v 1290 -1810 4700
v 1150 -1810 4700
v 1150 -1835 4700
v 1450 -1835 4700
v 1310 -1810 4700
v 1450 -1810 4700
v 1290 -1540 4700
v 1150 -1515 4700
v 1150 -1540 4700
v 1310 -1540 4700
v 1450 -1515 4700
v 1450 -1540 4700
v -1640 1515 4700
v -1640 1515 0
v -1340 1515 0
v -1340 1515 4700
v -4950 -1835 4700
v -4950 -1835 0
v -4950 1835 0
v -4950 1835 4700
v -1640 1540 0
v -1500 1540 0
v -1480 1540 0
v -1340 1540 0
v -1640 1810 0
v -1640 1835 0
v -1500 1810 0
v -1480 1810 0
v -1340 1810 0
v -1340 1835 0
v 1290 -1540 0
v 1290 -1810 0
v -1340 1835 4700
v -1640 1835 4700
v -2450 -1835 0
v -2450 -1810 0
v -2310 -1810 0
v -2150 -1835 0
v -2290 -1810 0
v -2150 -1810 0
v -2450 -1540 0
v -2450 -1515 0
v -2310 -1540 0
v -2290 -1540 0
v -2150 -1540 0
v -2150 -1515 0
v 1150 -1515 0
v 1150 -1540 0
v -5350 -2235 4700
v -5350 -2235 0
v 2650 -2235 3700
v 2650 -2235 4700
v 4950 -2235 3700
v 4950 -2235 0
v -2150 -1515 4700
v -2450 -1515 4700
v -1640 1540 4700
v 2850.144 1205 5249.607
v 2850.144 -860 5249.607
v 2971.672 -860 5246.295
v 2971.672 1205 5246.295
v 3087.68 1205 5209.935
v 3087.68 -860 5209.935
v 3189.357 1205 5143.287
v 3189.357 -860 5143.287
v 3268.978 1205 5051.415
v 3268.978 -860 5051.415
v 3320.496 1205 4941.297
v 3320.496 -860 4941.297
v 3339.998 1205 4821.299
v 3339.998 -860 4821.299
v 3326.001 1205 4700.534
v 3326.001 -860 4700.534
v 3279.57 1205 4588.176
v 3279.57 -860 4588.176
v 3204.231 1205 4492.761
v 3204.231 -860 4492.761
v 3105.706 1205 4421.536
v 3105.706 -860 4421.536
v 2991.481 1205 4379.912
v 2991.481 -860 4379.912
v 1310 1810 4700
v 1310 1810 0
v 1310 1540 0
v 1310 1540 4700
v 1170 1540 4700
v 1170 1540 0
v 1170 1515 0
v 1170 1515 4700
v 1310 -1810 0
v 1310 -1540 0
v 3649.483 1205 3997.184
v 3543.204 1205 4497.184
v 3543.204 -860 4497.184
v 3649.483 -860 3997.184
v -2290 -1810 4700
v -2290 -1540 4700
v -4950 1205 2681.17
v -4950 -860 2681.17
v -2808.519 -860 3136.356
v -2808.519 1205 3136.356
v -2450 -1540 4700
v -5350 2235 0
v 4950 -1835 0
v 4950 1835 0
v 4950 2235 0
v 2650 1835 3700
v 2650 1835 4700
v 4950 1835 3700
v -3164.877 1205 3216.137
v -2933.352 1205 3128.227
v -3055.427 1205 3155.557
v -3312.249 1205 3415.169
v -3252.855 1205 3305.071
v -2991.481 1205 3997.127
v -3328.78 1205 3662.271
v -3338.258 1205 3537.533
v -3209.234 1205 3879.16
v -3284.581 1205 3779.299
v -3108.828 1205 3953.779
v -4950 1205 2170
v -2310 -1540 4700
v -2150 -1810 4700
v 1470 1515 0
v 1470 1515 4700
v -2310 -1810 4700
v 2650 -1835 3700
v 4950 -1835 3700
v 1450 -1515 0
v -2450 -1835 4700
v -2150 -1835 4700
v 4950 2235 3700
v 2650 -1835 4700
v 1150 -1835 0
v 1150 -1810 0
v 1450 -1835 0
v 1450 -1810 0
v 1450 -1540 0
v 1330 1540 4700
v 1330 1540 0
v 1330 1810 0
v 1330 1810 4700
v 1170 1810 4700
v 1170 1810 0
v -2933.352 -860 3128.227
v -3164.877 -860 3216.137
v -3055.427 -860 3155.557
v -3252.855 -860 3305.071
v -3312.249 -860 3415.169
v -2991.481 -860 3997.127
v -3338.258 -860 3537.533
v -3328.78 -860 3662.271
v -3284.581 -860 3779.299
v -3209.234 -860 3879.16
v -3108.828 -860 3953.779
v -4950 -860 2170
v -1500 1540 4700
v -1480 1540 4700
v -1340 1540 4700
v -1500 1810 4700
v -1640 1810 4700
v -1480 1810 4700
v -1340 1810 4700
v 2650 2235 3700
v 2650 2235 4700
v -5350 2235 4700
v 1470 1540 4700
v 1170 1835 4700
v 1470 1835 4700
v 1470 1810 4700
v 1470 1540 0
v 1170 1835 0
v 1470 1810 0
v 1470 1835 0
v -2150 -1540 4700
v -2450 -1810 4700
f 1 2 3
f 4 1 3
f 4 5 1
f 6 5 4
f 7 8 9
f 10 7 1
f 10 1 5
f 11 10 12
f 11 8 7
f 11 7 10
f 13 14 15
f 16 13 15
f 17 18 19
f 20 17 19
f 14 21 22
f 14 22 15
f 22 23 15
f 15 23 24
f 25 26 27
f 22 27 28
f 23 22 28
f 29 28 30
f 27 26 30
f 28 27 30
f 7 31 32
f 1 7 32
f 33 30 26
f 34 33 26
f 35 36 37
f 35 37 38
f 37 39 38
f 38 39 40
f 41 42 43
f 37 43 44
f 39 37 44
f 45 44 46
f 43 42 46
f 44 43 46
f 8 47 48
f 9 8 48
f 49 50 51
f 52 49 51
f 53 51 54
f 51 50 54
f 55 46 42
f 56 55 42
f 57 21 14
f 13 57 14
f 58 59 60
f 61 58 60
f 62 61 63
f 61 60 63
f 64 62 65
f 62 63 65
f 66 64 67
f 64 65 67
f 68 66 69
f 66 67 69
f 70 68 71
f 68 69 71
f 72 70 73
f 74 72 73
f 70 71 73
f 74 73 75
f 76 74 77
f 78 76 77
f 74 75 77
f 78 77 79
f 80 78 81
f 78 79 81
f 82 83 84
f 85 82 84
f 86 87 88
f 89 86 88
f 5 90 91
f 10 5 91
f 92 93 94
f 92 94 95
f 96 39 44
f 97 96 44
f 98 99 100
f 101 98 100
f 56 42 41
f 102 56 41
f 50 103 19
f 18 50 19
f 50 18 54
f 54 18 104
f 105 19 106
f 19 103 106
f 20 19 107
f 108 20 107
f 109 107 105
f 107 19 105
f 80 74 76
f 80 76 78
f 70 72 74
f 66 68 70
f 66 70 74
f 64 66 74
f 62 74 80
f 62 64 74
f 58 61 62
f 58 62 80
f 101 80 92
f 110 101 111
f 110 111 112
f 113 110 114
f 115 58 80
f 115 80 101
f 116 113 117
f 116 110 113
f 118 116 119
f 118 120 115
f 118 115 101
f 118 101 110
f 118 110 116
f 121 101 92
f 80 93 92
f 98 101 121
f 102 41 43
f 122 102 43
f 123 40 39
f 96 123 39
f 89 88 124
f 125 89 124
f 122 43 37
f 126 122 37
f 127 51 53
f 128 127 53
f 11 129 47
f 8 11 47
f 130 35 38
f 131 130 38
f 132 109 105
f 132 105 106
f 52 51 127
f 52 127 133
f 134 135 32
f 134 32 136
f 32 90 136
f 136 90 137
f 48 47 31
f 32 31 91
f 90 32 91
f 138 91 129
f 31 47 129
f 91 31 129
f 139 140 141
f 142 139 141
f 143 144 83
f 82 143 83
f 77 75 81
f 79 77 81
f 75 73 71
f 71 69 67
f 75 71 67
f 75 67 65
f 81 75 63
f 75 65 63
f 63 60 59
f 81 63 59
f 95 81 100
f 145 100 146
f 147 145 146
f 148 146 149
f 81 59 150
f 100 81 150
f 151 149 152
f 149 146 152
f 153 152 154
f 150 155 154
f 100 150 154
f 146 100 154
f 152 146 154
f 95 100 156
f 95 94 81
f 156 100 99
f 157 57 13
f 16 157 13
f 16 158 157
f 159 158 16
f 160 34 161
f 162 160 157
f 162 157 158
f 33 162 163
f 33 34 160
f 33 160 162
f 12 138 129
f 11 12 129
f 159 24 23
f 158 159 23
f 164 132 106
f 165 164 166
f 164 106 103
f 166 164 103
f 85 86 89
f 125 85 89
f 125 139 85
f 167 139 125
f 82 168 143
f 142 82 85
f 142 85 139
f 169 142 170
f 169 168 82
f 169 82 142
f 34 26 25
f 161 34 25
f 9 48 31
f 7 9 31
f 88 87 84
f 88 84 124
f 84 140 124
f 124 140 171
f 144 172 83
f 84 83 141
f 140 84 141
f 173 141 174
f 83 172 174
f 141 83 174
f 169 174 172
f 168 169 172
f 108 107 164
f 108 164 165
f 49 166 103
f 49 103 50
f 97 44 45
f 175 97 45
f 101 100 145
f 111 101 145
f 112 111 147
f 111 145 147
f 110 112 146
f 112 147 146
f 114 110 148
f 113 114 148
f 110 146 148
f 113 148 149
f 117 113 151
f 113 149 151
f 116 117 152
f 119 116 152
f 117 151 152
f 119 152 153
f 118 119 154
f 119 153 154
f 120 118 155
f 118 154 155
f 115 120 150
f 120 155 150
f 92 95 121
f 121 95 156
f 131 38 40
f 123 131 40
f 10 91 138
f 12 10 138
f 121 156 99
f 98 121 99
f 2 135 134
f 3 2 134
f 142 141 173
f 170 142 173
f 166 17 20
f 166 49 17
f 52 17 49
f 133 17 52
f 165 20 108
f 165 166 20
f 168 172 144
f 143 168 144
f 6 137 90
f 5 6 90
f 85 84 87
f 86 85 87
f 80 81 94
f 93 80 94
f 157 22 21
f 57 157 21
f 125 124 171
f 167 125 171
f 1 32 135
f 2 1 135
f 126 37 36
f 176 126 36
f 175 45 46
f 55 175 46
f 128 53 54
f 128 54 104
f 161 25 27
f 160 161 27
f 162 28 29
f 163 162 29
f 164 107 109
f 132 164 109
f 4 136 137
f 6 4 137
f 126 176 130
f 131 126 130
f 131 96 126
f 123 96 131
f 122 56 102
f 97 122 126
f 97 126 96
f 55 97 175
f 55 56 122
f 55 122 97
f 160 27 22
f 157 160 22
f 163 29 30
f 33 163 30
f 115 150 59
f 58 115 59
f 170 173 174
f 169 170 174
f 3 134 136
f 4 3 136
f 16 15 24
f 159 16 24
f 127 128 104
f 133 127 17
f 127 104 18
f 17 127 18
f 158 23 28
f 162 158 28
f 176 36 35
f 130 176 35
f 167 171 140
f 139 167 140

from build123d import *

# Parameters (mm, degrees)
F1_DEPTH = 4700
F2_W     = 2300
F2_H     = 1000
F3_DEPTH = 4470.001
F6_DEPTH = 2065
F8_DEPTH = 4700


with BuildPart() as f1:
    # F0 (on Top) → F1 (new body)
    with BuildSketch(Plane.XY):
        Polygon((-4950, 1835), (4950, 1835), (4950, 2235), (-5350, 2235), (-5350, -2235), (4950, -2235), (4950, -1835), (-4950, -1835), align=None)
    extrude(amount=F1_DEPTH)

    # F2 (on face) → F3 (cut, through all)
    with BuildSketch(Plane.XZ.offset(2235)):
        with Locations((3800, 4200)):
            Rectangle(F2_W, F2_H)
    extrude(amount=-F3_DEPTH, mode=Mode.SUBTRACT)


with BuildPart() as f6:
    # F5 (on offset) → F6 (new body)
    with BuildSketch(Plane(origin=(0, -860, 0), x_dir=(-1, 0, 0), z_dir=(0, 1, 0))):
        with BuildLine():
            ThreePointArc((2808.51871225, 3136.3561994048), (3329.6245641025, 3475.421944552), (2991.4811439593, 3997.1267612645))
            Line((2991.4811439593, 3997.1267612645), (-2850.1435312752, 5249.6067315466))
            ThreePointArc((-2850.1435312752, 5249.6067315466), (-3334.4009139264, 4881.9730629905), (-2991.4811439592, 4379.9115545338))
            Line((-2991.4811439592, 4379.9115545338), (-3543.2043215449, 4497.183936155))
            Line((-3543.2043215449, 4497.183936155), (-3649.4826029137, 3997.1839336437))
            Line((-3649.4826029137, 3997.1839336437), (4950, 2170))
            Line((4950, 2170), (4950, 2681.1703))
            Line((4950, 2681.1703), (2808.51871225, 3136.3561994048))
        make_face()
    extrude(amount=F6_DEPTH)


with BuildPart() as f8:
    # F7 (on Top) → F8 (new body)
    with BuildSketch(Plane.XY):
        Polygon((-2450, -1810), (-2450, -1835), (-2150, -1835), (-2150, -1810), (-2290, -1810), (-2290, -1540), (-2150, -1540), (-2150, -1515), (-2450, -1515), (-2450, -1540), (-2310, -1540), (-2310, -1810), align=None)
    extrude(amount=F8_DEPTH)


with BuildPart() as f8b:
    # F7 (on Top) → F8, piece 2 (new body)
    with BuildSketch(Plane.XY):
        Polygon((1150, -1515), (1150, -1540), (1290, -1540), (1290, -1810), (1150, -1810), (1150, -1835), (1450, -1835), (1450, -1810), (1310, -1810), (1310, -1540), (1450, -1540), (1450, -1515), align=None)
    extrude(amount=F8_DEPTH)


with BuildPart() as f8c:
    # F7 (on Top) → F8, piece 3 (new body)
    with BuildSketch(Plane.XY):
        Polygon((-1640, 1540), (-1640, 1515), (-1340, 1515), (-1340, 1540), (-1480, 1540), (-1480, 1810), (-1340, 1810), (-1340, 1835), (-1640, 1835), (-1640, 1810), (-1500, 1810), (-1500, 1540), align=None)
    extrude(amount=F8_DEPTH)


with BuildPart() as f8d:
    # F7 (on Top) → F8, piece 4 (new body)
    with BuildSketch(Plane.XY):
        Polygon((1170, 1540), (1170, 1515), (1470, 1515), (1470, 1540), (1330, 1540), (1330, 1810), (1470, 1810), (1470, 1835), (1170, 1835), (1170, 1810), (1310, 1810), (1310, 1540), align=None)
    extrude(amount=F8_DEPTH)


solid = Compound([f1.part, f6.part, f8.part, f8b.part, f8c.part, f8d.part])
